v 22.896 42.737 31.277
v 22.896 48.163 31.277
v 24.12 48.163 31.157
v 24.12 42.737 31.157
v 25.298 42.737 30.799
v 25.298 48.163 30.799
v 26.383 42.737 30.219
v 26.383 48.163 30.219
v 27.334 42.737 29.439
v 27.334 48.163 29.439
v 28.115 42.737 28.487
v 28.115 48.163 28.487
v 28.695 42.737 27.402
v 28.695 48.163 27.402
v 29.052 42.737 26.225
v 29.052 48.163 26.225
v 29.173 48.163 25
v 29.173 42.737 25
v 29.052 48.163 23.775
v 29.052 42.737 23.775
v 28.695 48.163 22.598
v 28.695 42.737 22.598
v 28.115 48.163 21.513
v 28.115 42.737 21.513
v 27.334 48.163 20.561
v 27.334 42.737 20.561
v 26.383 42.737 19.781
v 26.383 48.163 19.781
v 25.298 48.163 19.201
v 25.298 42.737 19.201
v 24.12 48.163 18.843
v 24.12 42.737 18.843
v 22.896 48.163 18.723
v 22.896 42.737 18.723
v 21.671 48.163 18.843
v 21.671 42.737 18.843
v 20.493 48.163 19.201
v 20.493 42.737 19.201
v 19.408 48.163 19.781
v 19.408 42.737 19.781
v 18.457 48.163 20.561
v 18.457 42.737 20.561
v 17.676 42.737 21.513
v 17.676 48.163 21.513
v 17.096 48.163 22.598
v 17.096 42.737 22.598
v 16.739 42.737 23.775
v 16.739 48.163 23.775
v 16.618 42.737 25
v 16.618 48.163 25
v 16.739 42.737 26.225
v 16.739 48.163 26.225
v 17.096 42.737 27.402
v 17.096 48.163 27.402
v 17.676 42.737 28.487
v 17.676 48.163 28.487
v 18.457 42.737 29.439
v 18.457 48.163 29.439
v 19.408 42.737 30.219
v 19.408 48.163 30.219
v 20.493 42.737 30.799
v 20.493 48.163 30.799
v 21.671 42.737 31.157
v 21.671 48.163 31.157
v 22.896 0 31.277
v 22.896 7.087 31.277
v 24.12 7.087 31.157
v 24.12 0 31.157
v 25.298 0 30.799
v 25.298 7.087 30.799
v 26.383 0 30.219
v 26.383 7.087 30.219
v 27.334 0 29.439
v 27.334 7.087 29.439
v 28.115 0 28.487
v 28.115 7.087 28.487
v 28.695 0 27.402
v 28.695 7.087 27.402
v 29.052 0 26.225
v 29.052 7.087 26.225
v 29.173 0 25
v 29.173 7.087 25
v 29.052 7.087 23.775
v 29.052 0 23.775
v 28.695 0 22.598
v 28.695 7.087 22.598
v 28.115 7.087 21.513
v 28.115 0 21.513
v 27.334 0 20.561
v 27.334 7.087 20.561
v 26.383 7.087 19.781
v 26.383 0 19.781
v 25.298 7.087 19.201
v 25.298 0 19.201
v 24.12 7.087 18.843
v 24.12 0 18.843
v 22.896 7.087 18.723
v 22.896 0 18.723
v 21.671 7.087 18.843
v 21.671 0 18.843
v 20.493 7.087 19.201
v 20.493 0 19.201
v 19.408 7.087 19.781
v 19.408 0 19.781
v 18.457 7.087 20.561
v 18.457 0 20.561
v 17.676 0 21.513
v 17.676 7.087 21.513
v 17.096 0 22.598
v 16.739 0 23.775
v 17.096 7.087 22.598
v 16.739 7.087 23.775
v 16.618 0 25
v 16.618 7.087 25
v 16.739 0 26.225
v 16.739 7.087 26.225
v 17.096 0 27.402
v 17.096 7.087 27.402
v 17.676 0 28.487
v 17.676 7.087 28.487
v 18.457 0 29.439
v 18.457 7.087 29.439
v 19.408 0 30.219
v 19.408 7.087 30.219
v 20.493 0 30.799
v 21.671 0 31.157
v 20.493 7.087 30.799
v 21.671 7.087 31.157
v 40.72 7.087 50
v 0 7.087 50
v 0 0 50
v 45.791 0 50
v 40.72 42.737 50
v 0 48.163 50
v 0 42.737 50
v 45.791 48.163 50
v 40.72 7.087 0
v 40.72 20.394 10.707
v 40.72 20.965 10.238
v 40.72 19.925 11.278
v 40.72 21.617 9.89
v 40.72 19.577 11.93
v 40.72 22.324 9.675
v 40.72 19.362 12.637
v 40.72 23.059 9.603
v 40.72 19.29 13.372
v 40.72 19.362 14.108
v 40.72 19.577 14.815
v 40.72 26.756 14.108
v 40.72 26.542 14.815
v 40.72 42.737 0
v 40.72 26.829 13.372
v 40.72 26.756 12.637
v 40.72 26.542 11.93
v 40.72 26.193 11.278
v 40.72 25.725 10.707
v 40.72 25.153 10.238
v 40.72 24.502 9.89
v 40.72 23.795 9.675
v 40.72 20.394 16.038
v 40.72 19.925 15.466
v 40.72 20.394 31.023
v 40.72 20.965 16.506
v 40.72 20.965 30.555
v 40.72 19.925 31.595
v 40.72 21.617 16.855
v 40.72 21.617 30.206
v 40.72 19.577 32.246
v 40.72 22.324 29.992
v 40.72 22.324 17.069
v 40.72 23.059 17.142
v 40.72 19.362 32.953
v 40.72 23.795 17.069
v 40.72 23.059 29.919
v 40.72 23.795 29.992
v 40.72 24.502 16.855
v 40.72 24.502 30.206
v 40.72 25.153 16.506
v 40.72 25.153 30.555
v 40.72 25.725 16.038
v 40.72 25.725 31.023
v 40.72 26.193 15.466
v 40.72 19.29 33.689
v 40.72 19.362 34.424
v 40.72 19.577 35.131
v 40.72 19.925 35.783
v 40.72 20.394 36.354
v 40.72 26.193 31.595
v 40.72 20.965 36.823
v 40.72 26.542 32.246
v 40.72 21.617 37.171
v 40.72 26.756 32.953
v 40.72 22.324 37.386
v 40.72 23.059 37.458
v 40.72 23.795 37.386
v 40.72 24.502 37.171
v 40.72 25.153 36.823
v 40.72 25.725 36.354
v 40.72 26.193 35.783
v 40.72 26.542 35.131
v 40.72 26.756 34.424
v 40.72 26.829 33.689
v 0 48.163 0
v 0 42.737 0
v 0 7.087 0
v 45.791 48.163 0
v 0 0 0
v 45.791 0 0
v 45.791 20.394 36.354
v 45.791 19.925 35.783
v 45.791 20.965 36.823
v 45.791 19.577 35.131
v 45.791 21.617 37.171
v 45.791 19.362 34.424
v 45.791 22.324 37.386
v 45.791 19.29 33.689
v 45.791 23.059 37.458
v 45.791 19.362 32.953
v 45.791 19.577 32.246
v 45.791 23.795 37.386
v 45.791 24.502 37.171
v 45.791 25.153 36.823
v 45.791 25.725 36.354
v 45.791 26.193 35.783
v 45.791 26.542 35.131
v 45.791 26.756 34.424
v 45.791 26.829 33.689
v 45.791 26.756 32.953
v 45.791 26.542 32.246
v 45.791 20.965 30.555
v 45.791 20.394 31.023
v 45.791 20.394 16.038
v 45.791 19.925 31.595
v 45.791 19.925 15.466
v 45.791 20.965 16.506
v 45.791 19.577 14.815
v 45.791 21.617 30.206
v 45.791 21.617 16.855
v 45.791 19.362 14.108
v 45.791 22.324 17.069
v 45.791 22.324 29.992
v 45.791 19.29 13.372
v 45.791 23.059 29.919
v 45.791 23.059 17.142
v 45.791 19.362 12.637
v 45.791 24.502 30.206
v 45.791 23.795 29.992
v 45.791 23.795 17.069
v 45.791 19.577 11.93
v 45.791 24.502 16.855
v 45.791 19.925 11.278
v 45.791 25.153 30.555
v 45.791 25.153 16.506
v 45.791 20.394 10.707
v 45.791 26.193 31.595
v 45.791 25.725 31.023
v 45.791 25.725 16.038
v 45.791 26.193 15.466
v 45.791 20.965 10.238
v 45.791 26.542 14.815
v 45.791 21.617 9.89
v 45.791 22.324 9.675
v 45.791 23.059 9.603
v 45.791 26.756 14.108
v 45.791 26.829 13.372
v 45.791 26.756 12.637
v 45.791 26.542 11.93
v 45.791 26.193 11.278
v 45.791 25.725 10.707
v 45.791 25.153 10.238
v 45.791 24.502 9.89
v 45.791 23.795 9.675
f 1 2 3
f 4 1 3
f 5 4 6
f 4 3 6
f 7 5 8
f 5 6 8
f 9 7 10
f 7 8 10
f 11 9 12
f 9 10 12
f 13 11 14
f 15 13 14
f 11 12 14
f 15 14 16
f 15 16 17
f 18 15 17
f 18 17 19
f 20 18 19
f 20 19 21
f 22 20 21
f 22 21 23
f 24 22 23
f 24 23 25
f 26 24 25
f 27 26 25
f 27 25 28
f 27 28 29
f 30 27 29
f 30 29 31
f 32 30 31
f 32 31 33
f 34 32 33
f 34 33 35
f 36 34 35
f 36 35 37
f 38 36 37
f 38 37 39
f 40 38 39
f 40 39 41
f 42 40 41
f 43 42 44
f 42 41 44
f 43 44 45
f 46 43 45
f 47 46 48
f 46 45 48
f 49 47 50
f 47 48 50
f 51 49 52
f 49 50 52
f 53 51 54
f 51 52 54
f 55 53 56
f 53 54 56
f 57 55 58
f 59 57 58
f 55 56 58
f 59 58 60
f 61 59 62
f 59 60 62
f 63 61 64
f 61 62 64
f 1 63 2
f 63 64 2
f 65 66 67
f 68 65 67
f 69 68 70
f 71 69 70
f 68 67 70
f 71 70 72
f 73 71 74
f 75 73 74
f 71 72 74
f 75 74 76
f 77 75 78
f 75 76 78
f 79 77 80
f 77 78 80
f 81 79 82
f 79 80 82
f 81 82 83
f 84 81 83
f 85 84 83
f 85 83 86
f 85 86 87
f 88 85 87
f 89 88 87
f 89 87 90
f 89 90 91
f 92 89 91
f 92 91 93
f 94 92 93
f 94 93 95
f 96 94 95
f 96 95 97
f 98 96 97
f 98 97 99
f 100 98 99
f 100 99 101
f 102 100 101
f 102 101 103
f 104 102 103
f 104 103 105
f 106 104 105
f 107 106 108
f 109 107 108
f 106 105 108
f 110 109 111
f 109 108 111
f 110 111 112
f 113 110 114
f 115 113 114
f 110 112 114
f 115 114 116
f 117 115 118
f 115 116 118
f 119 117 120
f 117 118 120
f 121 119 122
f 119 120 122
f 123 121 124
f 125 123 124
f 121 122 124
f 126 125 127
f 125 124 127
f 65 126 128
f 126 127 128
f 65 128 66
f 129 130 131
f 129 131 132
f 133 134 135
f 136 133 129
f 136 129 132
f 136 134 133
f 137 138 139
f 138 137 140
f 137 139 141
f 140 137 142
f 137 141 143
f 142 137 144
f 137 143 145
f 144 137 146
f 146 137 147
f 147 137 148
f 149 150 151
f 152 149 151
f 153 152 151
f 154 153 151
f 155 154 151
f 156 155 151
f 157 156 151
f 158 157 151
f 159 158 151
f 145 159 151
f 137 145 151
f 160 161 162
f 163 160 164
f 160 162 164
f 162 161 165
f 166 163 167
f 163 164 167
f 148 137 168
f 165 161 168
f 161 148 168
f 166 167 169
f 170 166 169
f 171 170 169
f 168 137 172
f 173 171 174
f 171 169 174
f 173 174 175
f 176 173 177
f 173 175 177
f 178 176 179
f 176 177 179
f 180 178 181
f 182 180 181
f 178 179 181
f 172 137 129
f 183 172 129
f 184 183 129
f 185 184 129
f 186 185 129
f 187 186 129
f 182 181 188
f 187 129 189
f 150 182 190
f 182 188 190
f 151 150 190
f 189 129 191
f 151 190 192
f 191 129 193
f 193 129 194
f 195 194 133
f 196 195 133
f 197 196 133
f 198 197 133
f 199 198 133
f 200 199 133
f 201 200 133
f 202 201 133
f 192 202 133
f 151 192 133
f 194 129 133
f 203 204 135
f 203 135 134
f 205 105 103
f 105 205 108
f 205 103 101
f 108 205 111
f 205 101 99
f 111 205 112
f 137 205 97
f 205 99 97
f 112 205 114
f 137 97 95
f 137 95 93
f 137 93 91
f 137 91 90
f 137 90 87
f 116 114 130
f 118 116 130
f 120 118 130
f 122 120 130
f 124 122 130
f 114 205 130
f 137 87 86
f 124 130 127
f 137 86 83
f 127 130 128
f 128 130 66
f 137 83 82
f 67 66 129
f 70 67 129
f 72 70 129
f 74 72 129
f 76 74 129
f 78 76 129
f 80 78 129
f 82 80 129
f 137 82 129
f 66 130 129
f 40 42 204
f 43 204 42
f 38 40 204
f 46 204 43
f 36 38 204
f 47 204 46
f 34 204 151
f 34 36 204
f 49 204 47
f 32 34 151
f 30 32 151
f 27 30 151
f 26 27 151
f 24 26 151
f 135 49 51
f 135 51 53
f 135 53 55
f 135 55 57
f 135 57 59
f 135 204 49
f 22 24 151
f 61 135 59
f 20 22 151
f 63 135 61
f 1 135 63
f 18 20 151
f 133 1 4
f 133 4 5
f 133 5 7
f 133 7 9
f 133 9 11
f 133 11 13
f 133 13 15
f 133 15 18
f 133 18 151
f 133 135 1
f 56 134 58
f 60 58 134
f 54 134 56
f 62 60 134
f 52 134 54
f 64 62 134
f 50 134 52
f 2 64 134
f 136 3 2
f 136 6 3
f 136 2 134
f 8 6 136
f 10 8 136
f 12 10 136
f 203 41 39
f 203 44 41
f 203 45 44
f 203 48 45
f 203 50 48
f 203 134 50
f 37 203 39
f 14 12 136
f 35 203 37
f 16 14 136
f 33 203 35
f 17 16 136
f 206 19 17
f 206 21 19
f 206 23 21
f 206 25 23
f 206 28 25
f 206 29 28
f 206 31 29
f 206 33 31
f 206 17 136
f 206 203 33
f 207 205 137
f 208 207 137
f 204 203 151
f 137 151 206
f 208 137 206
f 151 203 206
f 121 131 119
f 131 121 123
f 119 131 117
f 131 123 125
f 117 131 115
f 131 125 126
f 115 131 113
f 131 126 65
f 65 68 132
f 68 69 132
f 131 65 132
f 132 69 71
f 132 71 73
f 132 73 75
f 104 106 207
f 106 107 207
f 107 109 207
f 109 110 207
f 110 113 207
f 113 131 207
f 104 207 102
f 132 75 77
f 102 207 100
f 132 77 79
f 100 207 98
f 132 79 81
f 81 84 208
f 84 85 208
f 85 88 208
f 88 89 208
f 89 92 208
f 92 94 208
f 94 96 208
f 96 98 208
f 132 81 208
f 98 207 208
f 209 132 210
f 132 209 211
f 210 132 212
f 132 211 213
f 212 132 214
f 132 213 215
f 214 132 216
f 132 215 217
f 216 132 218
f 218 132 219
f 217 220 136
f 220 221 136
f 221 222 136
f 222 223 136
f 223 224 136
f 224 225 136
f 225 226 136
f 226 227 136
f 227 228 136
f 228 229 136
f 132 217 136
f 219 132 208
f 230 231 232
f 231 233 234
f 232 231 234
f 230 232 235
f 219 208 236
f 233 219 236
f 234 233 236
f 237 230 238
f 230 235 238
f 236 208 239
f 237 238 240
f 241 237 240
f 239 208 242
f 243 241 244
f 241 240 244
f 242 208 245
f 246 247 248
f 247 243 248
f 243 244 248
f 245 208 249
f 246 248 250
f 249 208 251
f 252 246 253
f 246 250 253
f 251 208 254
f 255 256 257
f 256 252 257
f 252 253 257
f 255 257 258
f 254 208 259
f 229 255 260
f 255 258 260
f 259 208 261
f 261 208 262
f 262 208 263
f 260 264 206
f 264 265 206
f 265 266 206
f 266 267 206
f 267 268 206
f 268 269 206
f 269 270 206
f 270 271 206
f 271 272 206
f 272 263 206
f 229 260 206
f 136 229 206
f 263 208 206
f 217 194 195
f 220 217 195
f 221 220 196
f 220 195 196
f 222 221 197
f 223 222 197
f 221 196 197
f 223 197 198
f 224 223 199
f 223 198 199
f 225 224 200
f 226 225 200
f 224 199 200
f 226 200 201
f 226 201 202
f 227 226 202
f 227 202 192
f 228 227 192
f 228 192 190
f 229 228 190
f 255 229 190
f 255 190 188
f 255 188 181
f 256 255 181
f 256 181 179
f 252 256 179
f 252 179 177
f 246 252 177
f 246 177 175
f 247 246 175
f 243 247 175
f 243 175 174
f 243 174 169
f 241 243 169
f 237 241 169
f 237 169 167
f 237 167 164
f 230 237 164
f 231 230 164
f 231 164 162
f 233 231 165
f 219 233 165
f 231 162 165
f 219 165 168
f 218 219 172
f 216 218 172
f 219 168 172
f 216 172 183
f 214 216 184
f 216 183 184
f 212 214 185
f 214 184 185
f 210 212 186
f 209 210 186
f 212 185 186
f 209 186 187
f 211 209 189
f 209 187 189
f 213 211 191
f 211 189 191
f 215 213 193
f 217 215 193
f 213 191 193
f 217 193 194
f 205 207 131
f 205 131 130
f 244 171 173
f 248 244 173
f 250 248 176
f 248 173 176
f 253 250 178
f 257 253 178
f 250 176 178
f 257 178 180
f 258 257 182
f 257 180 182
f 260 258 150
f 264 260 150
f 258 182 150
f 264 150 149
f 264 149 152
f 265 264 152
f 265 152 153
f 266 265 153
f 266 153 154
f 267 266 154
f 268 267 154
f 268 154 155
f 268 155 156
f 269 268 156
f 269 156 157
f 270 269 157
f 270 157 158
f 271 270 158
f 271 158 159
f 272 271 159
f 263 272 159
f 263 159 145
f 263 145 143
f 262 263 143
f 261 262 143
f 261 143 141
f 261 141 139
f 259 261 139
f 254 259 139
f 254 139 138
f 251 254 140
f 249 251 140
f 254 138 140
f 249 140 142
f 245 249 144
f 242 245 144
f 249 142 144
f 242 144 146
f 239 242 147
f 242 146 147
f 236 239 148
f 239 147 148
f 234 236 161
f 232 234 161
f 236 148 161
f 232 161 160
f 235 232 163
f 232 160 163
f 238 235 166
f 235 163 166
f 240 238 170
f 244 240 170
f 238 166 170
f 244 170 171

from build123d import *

# Parameters (mm, degrees)
ESQUISSE1_W             = 45.791168344
ESQUISSE1_H             = 48.162822482
BOSS_EXTRU_1_DEPTH      = 50
ESQUISSE6_W             = 40.720467392
ESQUISSE6_H             = 35.64976644
ENL_V_MAT_EXTRU_2_DEPTH = 84.165428922
ESQUISSE7_R             = 6.277140529
ENL_V_MAT_EXTRU_3_DEPTH = 84.165428922
ESQUISSE8_R             = 3.769419749
ENL_V_MAT_EXTRU_4_DEPTH = 81.484867733


with BuildPart() as part:
    # Esquisse1 → Boss.-Extru.1 (new body)
    with BuildSketch(Plane.XY):
        with Locations((22.895584172, 24.081411241)):
            Rectangle(ESQUISSE1_W, ESQUISSE1_H)
    extrude(amount=BOSS_EXTRU_1_DEPTH)

    # Esquisse6 → Enlèv. mat.-Extru.2 (cut, through all)
    with BuildSketch(Plane.XY.offset(50)):
        with Locations((20.360233696, 24.911961355)):
            Rectangle(ESQUISSE6_W, ESQUISSE6_H)
    extrude(amount=-ENL_V_MAT_EXTRU_2_DEPTH, mode=Mode.SUBTRACT)

    # Esquisse7 → Enlèv. mat.-Extru.3 (cut, through all)
    with BuildSketch(Plane(origin=(0, 48.162822482, 0), x_dir=(1, 0, 0), z_dir=(0, 1, 0))):
        with Locations(Location((22.895584172, -25, 0), (0, 0, 270))):
            Circle(ESQUISSE7_R)
    extrude(amount=-ENL_V_MAT_EXTRU_3_DEPTH, mode=Mode.SUBTRACT)

    # Esquisse8 → Enlèv. mat.-Extru.4 (cut, through all)
    with BuildSketch(Plane.ZY.offset(-40.720467392)):
        with Locations((13.372298401, 23.059195716)):
            Circle(ESQUISSE8_R)
        with Locations((33.688831964, 23.059195716)):
            Circle(ESQUISSE8_R)
    extrude(amount=-ENL_V_MAT_EXTRU_4_DEPTH, mode=Mode.SUBTRACT)


solid = part.part
